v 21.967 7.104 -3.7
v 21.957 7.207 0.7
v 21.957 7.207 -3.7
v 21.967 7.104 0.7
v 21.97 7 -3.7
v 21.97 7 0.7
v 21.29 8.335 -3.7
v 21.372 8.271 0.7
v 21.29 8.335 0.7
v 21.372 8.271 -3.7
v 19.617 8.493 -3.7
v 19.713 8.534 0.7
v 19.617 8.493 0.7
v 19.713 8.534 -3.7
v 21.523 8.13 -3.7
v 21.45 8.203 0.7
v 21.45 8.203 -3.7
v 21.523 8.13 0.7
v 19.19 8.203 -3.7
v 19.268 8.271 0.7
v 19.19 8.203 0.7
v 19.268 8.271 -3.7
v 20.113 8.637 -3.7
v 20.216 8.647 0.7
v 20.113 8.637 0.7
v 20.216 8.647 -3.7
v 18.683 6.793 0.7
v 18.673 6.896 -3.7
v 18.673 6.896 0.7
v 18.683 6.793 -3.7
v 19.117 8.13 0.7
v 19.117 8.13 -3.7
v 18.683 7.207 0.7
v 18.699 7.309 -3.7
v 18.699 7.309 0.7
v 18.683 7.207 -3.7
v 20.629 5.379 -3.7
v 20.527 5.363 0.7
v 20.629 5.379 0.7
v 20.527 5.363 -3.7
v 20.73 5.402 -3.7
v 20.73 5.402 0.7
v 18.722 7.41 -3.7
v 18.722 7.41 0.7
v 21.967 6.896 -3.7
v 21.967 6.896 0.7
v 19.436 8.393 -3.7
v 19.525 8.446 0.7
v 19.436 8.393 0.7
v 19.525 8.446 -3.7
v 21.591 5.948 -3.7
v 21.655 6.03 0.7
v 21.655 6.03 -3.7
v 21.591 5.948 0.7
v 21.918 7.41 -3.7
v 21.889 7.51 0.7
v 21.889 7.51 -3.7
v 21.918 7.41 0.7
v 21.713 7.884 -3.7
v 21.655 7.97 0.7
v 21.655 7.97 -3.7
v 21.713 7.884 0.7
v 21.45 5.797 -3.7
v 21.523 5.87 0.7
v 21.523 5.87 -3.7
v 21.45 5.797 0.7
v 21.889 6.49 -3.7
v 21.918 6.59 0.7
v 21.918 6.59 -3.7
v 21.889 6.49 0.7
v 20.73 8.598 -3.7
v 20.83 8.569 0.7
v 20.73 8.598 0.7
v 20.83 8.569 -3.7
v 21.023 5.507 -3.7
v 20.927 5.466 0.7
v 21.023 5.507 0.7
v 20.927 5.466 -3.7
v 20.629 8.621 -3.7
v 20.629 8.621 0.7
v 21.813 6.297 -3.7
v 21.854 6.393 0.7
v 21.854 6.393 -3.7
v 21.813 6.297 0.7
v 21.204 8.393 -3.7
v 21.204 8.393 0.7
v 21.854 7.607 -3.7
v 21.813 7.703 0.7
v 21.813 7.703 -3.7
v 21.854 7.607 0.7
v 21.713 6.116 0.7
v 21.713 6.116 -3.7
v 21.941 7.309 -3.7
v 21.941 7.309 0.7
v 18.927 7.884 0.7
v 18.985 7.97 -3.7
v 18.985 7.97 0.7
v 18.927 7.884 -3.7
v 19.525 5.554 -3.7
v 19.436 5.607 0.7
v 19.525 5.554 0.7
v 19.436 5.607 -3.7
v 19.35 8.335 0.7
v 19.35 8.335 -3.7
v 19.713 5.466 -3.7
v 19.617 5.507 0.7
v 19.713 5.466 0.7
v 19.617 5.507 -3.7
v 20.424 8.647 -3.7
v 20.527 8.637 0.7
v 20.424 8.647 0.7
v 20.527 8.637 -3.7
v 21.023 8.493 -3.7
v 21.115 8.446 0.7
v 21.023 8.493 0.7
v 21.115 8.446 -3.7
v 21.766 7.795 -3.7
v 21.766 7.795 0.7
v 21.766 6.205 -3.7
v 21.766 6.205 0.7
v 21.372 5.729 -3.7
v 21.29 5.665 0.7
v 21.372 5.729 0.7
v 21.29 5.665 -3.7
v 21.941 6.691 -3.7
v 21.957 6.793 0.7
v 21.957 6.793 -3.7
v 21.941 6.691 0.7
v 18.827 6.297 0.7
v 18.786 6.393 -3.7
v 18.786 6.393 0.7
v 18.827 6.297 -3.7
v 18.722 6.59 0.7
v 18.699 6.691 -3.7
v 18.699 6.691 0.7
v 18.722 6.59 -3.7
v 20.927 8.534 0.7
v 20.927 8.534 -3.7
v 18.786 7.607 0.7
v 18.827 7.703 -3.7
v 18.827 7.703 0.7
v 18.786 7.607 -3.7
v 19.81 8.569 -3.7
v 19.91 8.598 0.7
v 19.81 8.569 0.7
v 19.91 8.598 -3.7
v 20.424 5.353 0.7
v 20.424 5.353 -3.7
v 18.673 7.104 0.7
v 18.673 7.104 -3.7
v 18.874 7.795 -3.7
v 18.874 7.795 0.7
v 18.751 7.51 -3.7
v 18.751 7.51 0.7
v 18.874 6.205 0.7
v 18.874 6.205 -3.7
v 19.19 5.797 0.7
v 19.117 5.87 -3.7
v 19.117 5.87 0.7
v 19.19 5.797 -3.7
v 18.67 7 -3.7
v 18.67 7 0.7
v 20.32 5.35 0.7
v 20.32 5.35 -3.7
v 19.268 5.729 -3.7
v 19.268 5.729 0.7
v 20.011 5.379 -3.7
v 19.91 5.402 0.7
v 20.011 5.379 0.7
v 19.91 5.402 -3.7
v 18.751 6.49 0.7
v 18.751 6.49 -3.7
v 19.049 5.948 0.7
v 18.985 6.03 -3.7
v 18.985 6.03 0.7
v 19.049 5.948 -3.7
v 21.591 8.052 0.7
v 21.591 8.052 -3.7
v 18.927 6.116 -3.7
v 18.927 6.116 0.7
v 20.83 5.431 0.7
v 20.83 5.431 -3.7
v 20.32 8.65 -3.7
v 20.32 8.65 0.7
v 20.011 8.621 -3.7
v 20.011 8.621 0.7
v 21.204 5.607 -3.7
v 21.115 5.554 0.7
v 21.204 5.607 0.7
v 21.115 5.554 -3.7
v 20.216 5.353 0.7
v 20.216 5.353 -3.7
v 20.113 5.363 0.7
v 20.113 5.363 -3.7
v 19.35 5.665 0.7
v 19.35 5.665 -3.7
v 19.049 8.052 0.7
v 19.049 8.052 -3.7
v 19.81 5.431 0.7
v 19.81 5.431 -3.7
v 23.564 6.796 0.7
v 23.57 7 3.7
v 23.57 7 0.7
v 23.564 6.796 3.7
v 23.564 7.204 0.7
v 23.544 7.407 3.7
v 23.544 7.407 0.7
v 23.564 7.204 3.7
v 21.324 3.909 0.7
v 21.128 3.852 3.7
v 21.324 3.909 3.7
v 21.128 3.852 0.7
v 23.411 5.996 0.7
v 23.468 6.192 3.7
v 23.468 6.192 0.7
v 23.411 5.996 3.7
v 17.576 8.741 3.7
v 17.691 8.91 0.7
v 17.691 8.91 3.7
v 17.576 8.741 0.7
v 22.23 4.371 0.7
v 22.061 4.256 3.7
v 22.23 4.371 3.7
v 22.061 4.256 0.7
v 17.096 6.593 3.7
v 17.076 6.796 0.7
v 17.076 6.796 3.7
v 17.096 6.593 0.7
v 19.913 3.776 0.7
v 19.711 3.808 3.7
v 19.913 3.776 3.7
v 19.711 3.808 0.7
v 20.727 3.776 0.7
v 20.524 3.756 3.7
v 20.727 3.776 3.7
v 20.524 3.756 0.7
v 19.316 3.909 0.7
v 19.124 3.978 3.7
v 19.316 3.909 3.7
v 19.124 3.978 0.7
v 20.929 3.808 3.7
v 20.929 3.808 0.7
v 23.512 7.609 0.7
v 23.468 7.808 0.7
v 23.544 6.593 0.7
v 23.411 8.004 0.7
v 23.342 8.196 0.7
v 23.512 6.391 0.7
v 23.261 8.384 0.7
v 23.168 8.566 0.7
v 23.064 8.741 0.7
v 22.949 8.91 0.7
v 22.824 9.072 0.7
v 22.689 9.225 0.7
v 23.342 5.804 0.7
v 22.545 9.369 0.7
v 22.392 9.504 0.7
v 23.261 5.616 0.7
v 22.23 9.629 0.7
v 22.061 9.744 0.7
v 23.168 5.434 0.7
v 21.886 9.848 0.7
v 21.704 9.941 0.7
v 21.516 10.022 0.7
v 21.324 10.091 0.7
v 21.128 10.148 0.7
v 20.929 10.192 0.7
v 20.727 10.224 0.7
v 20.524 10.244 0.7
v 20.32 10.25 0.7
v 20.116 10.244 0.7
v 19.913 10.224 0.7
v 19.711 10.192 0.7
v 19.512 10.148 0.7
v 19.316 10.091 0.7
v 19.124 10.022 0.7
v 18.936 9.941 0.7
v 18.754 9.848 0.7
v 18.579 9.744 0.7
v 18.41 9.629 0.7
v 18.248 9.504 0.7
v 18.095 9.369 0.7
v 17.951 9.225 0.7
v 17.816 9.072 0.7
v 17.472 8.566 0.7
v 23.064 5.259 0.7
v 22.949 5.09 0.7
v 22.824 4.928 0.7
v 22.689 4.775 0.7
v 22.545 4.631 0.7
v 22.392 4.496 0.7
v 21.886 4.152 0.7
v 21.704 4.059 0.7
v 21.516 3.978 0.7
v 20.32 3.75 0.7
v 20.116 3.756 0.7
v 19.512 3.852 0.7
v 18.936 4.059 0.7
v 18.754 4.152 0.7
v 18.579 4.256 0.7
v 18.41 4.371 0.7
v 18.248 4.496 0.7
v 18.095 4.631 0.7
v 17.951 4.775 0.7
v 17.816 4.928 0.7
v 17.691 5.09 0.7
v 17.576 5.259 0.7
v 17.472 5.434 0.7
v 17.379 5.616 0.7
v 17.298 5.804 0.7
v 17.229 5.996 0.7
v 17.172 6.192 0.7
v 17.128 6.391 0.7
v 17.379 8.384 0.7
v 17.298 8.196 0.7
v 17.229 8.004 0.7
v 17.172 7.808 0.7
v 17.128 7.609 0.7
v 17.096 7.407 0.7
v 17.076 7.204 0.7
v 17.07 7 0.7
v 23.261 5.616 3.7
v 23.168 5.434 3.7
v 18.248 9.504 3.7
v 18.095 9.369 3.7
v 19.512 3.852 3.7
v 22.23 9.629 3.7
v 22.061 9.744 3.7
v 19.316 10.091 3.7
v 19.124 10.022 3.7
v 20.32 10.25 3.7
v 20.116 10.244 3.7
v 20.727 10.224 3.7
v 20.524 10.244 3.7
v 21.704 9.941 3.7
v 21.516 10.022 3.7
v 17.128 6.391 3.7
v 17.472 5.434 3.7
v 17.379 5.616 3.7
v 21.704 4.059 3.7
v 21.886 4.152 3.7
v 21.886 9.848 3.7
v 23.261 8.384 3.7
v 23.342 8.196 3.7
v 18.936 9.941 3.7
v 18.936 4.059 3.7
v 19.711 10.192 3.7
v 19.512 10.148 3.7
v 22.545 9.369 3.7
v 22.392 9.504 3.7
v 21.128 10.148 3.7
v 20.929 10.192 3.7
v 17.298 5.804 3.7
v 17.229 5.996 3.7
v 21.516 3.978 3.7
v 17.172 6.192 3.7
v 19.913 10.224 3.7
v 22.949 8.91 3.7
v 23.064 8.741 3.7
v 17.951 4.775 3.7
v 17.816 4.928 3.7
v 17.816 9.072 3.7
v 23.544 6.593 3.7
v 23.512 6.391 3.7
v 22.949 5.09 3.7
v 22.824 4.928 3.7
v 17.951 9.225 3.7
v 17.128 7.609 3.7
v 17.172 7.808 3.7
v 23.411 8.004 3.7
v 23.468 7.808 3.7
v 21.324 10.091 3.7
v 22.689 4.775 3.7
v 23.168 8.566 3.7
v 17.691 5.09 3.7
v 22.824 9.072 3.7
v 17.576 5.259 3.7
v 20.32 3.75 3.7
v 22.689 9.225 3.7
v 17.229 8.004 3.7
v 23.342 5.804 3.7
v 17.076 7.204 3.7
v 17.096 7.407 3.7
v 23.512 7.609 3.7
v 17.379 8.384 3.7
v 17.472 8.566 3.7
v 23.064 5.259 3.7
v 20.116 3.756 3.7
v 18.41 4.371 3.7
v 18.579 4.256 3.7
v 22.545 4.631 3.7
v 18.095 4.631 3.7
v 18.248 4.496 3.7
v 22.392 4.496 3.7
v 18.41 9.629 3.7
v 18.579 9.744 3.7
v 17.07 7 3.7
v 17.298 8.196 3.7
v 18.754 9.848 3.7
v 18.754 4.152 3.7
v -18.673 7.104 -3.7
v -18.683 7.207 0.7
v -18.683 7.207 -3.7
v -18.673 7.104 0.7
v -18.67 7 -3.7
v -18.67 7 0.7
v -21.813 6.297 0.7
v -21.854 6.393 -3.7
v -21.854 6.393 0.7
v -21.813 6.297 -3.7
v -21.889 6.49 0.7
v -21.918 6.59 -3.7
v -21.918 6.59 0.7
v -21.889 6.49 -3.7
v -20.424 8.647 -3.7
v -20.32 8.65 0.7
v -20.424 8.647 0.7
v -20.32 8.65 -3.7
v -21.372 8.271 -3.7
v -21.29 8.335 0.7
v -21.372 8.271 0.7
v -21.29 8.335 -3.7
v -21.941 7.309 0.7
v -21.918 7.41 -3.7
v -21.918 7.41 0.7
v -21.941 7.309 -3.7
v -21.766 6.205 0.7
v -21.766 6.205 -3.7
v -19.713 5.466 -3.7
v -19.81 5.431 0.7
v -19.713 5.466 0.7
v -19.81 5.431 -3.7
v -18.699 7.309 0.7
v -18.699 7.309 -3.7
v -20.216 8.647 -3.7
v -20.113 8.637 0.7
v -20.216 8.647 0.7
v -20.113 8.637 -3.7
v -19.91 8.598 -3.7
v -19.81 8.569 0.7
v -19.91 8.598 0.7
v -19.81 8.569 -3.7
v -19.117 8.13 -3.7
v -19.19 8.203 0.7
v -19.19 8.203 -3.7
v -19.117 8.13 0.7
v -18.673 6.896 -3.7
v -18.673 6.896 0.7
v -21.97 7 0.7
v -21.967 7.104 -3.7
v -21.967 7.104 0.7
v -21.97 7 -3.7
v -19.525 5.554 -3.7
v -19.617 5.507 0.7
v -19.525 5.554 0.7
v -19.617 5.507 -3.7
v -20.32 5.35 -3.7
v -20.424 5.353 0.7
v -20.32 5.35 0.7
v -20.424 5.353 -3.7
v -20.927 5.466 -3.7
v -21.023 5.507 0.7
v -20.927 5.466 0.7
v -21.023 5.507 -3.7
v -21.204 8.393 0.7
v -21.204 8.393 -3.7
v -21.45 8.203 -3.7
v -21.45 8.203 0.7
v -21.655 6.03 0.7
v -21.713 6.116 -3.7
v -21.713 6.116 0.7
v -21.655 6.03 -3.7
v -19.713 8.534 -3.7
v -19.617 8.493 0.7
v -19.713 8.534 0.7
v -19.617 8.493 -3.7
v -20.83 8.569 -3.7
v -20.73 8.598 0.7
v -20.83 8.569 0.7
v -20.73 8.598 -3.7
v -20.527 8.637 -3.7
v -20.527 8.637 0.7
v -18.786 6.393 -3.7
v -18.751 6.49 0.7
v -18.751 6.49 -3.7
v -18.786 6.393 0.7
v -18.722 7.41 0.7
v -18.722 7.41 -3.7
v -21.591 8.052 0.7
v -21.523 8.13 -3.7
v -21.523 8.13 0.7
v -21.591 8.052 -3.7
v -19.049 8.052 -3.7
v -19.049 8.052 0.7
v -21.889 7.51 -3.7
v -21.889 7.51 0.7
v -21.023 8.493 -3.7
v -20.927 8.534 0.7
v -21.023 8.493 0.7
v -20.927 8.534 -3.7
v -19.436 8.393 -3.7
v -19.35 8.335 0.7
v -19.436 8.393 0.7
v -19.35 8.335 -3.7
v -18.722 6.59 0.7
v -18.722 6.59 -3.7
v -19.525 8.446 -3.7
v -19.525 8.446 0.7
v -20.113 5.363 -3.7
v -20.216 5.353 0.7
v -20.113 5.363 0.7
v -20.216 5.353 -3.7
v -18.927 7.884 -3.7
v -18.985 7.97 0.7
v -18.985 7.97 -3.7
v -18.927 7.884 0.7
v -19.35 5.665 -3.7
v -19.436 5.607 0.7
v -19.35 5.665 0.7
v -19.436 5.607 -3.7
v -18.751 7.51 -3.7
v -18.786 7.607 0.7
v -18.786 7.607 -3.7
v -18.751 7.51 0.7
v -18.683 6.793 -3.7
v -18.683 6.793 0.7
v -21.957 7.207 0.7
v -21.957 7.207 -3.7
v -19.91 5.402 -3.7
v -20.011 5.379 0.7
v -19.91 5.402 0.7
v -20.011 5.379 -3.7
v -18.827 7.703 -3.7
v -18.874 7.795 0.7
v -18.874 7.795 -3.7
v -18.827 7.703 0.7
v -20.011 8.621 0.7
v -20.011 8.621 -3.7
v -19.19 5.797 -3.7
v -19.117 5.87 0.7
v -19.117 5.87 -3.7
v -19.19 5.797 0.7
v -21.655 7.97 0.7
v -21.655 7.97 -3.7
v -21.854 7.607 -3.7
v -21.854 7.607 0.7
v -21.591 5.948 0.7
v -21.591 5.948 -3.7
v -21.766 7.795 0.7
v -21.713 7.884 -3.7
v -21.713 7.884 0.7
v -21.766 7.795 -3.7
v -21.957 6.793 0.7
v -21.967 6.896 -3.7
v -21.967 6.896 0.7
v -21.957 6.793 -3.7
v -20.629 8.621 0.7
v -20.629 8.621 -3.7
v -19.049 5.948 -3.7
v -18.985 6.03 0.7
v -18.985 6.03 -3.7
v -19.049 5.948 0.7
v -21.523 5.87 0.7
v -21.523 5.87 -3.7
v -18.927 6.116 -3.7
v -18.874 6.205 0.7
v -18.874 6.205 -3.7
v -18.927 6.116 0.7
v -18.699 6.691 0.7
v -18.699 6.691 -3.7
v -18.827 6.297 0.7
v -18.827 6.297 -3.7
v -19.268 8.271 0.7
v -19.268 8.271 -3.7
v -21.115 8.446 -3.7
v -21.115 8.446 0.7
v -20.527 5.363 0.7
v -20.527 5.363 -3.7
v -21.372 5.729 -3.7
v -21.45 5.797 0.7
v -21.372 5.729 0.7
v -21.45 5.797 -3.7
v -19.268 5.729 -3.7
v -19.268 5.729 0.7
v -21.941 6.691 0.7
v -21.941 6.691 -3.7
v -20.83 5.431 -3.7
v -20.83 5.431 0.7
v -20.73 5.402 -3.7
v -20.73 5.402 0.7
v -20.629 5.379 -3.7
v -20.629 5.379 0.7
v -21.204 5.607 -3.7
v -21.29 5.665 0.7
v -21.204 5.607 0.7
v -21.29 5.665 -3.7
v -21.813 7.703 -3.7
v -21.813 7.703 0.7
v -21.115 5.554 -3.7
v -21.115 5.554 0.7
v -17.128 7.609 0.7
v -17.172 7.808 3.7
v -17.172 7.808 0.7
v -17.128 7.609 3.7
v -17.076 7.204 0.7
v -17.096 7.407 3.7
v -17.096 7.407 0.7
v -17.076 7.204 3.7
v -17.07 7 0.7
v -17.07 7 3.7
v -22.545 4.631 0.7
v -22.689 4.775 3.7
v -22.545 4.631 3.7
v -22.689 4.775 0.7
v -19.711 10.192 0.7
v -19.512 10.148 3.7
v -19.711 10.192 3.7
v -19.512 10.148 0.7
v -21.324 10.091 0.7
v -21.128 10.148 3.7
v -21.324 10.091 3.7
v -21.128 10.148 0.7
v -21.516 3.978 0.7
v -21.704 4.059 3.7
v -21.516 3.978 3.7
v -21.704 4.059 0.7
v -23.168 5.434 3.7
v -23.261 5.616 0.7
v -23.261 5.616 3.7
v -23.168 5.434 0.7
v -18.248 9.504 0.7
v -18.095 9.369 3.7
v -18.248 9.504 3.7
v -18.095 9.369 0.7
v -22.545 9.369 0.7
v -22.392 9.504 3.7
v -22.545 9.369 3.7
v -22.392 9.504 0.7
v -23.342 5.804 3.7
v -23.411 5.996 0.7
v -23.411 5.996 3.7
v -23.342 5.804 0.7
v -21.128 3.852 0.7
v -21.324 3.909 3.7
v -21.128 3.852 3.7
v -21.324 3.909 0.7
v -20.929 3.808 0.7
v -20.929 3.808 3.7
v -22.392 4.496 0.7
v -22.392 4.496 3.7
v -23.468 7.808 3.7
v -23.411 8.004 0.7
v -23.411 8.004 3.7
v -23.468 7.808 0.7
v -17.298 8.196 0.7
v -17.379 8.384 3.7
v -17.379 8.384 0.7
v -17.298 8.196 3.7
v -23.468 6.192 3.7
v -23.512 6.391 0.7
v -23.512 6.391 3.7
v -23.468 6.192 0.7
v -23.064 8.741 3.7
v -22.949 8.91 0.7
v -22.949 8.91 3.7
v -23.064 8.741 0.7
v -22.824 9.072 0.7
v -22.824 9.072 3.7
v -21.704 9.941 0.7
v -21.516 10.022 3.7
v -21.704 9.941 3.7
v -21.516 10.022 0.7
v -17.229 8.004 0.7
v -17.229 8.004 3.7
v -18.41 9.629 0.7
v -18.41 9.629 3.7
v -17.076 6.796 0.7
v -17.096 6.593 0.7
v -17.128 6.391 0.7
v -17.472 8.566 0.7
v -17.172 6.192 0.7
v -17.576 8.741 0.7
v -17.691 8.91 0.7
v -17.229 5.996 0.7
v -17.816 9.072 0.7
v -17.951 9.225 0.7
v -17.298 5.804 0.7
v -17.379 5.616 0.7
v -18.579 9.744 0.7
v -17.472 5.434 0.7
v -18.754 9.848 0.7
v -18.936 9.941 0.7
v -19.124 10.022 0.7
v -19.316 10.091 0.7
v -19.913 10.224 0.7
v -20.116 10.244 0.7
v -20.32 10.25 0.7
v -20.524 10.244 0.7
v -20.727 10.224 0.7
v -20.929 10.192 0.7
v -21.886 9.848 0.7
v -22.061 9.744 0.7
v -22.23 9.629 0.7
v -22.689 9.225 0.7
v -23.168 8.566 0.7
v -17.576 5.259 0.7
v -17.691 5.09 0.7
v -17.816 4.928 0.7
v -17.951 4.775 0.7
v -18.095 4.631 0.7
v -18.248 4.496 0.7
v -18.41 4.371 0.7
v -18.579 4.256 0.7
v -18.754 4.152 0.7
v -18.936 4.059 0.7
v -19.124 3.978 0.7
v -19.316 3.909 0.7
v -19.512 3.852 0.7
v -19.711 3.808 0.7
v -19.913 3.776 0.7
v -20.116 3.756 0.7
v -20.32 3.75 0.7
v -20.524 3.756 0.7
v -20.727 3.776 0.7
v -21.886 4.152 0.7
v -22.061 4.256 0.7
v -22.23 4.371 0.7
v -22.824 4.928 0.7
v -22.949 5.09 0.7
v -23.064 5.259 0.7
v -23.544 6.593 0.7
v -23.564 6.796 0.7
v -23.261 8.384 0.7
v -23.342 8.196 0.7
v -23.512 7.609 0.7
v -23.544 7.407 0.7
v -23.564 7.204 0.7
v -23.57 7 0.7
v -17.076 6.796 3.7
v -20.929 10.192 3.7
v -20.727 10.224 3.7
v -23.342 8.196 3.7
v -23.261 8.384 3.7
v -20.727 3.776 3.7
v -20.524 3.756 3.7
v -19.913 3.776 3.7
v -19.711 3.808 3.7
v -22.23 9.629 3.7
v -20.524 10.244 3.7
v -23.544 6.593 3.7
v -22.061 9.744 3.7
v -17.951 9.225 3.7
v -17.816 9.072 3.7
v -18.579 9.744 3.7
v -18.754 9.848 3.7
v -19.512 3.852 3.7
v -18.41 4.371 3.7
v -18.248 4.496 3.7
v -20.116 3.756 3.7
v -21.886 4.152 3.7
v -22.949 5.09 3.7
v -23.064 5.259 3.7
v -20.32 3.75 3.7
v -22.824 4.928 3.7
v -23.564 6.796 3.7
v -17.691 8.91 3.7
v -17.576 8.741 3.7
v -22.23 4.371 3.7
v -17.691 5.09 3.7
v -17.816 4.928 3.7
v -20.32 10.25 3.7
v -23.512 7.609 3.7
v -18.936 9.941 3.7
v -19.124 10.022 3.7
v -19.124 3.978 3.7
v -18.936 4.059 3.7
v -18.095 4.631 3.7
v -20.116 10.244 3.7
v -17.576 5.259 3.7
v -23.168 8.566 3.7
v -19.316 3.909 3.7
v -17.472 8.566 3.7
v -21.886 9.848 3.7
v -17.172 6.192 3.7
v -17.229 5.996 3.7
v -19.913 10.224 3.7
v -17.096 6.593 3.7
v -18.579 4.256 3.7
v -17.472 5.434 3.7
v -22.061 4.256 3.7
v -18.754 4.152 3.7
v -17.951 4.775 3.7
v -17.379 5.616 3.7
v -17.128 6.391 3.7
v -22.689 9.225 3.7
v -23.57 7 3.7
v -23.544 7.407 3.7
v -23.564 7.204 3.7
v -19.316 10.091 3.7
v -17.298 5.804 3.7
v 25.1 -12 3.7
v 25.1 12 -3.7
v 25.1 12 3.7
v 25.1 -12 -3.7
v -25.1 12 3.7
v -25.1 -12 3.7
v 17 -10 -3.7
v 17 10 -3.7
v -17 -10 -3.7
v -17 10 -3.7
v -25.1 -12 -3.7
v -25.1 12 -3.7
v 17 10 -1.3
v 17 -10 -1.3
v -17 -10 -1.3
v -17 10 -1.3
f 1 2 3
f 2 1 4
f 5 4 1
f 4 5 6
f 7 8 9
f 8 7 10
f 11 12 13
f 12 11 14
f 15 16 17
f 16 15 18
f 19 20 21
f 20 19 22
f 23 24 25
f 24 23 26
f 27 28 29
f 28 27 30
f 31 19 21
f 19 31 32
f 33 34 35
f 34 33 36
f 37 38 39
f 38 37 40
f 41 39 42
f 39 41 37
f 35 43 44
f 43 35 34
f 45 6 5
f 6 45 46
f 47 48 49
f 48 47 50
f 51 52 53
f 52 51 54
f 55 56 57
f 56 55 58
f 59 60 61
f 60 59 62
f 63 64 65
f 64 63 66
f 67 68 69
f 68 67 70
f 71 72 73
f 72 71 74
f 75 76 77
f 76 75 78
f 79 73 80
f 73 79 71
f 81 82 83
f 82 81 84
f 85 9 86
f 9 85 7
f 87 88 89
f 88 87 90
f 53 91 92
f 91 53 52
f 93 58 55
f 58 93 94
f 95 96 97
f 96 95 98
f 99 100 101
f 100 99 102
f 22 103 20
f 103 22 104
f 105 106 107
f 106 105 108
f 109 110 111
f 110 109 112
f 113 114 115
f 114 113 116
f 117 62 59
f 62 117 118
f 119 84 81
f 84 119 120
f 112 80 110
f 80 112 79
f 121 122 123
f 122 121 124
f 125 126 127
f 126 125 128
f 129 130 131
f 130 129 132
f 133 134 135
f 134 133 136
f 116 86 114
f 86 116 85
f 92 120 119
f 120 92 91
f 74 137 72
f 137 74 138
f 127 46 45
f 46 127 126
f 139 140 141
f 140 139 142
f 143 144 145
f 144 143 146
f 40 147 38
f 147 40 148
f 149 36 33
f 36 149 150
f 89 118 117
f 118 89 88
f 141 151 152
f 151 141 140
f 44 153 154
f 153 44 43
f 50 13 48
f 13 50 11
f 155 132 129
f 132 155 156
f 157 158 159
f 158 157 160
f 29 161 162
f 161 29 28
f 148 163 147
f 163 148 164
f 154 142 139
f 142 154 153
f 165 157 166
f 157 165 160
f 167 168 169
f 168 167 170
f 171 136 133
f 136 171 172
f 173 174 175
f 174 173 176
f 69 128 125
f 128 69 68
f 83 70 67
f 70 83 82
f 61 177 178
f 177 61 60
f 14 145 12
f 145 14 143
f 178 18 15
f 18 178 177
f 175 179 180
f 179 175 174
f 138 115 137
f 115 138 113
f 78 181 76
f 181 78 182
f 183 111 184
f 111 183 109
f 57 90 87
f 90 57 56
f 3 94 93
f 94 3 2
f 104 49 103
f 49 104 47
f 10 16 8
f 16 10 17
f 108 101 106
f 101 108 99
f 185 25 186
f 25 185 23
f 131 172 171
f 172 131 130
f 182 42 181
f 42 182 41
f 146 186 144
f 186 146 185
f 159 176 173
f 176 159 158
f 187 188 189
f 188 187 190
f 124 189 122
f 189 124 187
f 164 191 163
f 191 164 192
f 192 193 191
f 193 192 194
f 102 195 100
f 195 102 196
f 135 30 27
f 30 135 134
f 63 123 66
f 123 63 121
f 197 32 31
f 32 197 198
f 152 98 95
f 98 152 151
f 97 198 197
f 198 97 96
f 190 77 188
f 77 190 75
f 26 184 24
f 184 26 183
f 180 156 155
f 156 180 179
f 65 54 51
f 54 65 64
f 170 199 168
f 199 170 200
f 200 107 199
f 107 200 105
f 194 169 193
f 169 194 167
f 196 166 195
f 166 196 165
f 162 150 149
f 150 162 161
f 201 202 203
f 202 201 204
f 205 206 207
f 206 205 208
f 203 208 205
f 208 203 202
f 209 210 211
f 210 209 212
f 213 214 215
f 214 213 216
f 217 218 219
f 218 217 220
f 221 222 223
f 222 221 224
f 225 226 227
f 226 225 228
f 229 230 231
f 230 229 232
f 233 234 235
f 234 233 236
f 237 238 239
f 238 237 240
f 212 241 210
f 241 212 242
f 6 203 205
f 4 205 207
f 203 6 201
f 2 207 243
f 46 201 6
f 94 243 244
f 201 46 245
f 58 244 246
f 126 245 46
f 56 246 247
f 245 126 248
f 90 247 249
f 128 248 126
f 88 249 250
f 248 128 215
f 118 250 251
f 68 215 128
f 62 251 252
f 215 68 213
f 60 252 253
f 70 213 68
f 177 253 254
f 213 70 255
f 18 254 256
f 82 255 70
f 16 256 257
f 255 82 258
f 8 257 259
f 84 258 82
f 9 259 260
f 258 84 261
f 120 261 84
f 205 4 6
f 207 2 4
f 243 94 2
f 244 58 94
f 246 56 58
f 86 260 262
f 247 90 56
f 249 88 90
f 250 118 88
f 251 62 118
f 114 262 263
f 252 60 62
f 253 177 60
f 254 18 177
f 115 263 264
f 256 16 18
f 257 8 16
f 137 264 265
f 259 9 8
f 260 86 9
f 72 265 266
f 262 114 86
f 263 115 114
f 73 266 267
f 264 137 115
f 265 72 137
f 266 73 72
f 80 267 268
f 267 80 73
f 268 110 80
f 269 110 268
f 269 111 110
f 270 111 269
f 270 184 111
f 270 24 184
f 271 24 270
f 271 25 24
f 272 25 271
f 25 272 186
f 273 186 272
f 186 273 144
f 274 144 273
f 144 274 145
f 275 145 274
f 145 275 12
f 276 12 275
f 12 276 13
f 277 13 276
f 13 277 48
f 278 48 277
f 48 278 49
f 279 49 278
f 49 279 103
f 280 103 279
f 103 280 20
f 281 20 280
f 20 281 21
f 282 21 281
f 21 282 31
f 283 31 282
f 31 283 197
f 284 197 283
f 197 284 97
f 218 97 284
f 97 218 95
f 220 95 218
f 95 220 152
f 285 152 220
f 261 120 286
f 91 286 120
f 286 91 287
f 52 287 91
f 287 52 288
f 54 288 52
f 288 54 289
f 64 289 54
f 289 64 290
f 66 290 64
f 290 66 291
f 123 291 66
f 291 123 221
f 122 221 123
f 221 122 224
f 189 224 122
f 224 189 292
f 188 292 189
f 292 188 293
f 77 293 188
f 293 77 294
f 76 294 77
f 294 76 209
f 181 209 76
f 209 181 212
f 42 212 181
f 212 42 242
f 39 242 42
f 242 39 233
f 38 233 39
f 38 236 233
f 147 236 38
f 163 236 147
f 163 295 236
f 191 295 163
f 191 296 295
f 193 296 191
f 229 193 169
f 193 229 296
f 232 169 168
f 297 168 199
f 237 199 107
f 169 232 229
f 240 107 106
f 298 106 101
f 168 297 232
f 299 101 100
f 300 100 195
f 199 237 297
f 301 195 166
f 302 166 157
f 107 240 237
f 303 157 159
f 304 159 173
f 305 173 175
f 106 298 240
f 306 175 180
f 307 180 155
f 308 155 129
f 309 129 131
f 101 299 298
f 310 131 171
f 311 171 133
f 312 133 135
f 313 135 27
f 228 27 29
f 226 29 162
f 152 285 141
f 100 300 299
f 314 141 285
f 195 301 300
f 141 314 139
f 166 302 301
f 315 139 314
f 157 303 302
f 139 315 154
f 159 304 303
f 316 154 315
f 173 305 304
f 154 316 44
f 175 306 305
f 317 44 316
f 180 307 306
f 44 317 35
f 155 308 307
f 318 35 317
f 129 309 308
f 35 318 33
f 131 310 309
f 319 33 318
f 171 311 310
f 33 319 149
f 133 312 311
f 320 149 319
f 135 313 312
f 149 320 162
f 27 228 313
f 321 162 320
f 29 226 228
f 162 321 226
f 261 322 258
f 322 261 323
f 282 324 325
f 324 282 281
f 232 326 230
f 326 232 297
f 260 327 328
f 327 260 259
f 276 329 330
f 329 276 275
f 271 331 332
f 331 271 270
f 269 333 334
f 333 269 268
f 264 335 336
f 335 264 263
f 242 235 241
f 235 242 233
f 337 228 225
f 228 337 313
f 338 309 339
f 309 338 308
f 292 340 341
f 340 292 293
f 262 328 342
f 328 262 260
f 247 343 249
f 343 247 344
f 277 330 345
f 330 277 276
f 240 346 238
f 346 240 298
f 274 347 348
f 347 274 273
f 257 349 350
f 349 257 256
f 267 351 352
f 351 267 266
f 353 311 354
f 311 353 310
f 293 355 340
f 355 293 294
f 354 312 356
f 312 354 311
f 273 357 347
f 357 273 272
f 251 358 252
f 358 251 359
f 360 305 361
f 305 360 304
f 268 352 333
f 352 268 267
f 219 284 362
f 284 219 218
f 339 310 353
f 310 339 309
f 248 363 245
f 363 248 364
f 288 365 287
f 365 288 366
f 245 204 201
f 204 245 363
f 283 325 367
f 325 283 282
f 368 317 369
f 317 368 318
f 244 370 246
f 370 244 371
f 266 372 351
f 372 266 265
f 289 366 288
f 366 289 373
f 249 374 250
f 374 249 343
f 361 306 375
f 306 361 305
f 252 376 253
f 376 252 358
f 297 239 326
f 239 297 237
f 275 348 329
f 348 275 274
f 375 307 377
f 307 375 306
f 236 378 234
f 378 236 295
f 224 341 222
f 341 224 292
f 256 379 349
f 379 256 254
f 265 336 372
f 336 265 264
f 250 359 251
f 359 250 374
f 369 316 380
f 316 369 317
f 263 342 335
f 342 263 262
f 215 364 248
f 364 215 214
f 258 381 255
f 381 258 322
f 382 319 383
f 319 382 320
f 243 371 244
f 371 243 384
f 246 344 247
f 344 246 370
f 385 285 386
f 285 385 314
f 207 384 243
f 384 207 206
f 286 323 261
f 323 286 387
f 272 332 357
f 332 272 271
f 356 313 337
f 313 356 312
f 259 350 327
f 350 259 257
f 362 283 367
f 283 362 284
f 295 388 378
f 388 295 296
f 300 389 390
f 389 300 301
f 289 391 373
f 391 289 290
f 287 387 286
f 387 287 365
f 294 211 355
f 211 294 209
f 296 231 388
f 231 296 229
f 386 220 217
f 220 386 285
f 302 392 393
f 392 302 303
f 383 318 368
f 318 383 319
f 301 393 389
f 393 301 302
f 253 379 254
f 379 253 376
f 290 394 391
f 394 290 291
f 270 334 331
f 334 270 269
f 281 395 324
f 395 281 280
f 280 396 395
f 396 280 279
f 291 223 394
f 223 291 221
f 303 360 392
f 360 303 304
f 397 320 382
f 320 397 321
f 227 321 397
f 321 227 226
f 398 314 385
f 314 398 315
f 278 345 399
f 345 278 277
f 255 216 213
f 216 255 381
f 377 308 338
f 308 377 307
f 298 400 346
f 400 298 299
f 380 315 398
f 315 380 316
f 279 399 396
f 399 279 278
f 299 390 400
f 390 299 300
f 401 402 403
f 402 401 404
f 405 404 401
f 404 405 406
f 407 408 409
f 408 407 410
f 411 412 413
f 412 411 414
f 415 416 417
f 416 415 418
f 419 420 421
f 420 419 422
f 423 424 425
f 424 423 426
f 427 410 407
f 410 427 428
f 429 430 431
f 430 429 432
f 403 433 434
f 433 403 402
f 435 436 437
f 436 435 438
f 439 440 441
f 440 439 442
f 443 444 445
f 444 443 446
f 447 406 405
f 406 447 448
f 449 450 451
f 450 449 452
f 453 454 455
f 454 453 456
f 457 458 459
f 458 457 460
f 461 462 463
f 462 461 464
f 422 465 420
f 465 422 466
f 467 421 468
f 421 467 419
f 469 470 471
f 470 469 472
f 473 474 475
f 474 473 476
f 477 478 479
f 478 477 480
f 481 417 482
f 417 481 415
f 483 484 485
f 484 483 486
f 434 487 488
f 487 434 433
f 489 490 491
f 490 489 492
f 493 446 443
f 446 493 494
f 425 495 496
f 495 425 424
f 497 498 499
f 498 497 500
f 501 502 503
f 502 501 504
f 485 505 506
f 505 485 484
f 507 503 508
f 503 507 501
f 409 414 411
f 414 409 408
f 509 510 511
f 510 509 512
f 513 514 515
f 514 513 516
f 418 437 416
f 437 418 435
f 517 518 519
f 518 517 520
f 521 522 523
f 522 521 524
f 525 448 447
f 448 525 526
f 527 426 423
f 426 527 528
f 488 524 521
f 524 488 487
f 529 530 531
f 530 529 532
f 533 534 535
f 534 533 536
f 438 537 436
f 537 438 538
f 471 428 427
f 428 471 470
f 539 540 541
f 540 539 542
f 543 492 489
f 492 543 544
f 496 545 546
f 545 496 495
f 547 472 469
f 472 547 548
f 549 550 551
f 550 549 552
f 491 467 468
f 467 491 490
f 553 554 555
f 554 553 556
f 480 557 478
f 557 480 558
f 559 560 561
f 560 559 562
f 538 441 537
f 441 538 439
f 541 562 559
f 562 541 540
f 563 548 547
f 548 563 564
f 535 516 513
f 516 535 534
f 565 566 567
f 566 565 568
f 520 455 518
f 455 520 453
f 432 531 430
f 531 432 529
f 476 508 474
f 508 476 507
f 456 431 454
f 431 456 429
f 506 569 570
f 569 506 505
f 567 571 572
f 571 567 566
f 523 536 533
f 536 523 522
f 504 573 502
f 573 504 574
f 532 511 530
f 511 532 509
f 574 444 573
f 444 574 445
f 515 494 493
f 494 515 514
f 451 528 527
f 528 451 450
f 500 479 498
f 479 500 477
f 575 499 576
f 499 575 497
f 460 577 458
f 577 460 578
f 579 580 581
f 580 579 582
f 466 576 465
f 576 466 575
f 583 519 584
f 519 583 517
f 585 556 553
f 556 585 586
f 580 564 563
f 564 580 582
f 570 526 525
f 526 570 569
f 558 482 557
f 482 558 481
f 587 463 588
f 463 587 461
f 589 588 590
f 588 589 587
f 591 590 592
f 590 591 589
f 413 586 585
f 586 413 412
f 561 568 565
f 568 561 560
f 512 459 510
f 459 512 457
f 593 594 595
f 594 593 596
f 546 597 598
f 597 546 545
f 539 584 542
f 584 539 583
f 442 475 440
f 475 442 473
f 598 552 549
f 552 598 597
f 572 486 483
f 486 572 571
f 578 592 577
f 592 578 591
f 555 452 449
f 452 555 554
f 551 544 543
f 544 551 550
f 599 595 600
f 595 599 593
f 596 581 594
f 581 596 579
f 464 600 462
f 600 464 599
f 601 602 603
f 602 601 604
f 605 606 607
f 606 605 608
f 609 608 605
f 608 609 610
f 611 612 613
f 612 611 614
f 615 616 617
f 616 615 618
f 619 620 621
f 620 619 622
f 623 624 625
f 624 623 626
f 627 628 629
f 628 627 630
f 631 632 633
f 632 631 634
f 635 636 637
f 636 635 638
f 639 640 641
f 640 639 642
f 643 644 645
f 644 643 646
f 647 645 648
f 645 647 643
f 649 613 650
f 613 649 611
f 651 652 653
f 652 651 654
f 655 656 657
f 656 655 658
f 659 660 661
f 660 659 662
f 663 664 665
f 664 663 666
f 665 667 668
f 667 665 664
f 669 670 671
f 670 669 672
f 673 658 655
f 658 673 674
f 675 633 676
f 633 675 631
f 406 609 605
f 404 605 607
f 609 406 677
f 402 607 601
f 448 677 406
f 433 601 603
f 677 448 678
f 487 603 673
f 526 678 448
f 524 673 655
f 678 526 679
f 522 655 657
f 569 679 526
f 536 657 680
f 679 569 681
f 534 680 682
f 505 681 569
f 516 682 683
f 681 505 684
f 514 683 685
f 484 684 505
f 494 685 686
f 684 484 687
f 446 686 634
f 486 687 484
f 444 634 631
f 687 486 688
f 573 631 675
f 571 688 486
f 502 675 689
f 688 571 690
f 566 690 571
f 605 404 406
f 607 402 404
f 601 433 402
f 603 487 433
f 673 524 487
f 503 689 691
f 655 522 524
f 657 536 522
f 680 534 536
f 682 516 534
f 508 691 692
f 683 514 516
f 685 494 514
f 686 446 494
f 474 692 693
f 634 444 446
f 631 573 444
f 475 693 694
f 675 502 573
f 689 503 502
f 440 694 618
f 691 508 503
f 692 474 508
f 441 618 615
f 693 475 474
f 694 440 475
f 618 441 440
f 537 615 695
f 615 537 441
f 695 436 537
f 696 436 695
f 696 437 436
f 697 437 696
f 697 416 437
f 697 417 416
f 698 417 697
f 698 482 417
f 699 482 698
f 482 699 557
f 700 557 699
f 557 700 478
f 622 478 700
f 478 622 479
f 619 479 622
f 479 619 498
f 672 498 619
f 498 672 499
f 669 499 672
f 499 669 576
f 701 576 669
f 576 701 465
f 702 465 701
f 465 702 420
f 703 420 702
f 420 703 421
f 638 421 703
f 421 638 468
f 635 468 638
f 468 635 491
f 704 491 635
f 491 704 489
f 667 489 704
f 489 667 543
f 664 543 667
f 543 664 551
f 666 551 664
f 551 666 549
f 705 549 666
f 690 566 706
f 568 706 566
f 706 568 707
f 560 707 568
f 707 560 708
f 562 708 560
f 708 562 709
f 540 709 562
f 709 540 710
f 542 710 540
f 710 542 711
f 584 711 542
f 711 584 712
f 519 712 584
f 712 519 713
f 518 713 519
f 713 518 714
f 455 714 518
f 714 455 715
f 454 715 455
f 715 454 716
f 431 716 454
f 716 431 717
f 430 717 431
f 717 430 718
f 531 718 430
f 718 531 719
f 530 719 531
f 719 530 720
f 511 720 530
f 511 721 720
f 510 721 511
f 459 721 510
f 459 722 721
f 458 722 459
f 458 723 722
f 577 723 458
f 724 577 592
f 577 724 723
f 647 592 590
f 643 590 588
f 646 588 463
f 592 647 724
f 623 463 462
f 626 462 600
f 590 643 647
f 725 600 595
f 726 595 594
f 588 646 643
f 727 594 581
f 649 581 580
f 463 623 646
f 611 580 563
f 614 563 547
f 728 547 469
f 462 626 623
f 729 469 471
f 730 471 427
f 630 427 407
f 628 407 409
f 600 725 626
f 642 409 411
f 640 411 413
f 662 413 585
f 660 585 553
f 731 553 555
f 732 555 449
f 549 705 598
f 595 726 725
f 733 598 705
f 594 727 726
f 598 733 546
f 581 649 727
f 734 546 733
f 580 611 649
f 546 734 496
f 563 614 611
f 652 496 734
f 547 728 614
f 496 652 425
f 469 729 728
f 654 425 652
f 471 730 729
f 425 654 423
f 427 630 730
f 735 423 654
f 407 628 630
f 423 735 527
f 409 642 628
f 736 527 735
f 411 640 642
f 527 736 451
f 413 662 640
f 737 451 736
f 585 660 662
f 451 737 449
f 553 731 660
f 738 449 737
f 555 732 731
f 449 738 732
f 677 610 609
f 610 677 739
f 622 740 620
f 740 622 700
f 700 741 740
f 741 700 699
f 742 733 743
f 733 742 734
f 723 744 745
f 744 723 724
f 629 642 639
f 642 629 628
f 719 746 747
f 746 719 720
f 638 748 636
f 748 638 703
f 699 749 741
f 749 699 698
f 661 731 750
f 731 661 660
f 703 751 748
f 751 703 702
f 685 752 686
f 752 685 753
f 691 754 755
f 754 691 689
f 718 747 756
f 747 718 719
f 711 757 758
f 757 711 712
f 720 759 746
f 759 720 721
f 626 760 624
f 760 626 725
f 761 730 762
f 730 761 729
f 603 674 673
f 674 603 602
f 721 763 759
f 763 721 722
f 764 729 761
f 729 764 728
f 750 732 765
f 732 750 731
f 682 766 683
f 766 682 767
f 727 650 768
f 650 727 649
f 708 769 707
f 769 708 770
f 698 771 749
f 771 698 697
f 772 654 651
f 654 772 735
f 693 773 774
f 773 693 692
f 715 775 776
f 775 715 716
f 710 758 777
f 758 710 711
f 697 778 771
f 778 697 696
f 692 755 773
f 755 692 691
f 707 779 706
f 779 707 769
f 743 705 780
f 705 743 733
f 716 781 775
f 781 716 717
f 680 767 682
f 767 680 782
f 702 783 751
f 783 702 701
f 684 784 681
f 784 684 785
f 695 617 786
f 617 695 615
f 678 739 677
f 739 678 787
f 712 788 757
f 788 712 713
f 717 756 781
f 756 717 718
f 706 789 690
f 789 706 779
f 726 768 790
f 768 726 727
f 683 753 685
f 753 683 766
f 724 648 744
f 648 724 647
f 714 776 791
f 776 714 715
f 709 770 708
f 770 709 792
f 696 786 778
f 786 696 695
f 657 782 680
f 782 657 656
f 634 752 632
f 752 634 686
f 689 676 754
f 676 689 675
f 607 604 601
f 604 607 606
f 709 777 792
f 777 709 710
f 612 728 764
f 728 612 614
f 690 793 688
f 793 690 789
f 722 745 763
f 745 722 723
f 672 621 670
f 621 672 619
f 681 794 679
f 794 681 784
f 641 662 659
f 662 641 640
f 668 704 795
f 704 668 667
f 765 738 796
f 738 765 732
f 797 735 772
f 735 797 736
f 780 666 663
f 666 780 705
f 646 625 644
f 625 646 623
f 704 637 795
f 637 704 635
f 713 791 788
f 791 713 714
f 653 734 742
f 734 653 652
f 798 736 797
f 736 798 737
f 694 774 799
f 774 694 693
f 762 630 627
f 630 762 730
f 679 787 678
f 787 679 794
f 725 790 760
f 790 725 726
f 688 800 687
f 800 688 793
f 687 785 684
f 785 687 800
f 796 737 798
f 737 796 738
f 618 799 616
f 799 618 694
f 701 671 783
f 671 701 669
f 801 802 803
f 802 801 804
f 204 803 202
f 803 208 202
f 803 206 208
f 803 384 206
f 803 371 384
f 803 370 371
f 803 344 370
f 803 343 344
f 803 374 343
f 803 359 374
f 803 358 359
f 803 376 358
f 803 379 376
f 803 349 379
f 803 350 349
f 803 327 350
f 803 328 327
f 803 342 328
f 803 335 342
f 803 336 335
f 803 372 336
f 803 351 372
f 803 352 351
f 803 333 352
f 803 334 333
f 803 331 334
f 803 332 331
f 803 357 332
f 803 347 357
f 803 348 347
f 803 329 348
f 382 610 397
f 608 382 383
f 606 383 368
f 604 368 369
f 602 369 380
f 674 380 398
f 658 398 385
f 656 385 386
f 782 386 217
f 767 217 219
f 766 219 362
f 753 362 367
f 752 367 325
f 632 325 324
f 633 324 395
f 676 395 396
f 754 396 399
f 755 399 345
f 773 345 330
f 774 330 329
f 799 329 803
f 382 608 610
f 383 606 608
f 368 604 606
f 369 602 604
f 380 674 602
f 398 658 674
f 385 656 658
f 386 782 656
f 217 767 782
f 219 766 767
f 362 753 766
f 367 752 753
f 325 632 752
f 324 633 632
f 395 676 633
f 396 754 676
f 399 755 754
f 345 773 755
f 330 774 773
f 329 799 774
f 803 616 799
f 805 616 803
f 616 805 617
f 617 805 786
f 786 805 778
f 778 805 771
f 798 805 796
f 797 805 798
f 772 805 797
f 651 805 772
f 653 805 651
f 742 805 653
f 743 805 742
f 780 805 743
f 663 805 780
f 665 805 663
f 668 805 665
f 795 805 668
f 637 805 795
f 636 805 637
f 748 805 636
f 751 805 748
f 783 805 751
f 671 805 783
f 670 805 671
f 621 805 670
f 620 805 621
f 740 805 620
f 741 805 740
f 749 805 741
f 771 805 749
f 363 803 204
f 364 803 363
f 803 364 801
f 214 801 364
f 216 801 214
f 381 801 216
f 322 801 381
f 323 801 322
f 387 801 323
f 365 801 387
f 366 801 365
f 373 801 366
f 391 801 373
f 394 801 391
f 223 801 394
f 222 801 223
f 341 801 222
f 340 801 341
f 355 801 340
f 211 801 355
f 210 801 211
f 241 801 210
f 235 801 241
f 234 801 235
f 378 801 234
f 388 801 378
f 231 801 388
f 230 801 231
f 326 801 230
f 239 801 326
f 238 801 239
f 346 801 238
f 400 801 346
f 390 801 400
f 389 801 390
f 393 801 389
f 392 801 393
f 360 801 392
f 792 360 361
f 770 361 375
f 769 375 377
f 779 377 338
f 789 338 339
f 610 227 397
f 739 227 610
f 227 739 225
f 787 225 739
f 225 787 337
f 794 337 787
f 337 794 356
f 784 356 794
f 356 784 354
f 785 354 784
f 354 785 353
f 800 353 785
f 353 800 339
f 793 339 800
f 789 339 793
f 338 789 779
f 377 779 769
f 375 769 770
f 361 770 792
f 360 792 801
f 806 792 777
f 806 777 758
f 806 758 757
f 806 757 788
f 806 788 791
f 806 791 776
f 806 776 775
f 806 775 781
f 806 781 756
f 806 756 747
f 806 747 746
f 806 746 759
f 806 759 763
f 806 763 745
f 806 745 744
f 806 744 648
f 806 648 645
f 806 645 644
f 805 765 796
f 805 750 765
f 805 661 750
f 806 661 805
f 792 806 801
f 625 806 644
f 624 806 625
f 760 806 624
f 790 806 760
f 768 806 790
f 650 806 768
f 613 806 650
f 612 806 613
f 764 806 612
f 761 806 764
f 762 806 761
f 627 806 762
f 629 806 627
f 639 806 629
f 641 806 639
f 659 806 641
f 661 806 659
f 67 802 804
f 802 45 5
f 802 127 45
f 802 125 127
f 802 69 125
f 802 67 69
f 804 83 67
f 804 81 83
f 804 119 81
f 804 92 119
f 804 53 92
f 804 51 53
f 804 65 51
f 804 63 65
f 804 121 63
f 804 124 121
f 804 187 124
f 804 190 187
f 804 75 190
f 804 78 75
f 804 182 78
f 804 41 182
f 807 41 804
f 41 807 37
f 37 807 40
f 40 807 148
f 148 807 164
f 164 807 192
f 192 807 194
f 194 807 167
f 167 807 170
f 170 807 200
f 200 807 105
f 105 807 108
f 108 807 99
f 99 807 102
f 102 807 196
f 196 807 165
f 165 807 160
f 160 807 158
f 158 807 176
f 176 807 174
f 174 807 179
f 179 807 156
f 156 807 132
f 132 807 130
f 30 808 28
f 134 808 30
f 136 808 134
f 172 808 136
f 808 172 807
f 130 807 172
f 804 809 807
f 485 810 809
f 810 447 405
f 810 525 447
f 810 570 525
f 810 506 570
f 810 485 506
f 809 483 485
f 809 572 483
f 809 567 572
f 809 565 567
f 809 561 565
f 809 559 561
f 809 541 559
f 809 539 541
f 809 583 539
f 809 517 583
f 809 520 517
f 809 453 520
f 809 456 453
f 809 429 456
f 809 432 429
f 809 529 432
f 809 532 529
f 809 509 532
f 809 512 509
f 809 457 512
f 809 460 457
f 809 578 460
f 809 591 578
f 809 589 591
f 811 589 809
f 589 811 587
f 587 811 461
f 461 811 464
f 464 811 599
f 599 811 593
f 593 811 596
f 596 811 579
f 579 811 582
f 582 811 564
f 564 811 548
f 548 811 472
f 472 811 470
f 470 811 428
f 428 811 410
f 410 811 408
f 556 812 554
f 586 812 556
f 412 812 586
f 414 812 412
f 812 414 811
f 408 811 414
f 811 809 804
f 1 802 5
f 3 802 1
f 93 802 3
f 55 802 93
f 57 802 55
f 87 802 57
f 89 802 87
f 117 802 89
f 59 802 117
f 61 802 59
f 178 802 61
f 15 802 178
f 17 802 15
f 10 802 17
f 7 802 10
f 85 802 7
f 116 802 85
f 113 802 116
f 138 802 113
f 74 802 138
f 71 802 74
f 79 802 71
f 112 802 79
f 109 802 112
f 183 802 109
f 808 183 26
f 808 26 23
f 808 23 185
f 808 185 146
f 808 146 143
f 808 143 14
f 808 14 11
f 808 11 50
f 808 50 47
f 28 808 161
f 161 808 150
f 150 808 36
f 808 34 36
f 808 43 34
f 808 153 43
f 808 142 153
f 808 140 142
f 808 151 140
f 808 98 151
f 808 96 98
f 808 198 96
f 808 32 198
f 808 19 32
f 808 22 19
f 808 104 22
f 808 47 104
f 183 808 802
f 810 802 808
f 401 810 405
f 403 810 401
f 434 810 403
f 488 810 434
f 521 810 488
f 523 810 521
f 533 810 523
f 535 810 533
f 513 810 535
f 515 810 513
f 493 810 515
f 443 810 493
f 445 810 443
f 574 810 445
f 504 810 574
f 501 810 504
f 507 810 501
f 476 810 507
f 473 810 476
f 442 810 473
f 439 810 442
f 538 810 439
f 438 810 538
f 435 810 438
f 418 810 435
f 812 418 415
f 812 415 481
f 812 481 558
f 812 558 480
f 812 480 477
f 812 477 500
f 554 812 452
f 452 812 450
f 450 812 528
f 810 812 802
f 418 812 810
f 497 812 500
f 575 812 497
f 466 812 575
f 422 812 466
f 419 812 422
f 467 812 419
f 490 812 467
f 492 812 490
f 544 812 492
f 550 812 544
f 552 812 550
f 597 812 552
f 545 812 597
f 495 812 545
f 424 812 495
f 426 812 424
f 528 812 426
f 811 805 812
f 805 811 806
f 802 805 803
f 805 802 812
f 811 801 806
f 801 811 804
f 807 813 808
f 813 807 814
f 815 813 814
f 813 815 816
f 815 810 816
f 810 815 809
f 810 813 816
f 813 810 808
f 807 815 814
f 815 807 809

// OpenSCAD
$fn=100;

repair_s=2;
repair=100;

//sirka sroubu 
vzdalenost_sroubu=4*10.16; //jejich stredu

//rozmery diody
di_in_x=34;
di_in_y=20;
di_in_z=2.4;

//stinitko diody
di_out_x=50.2;
di_out_y=24;
di_out_z=di_in_z+5;

nut_d_y_2=26.6+38;
thickness=5;

box_out_y=120;
box_in_y=box_out_y-2*thickness;


//nut
nut_height=2.2+repair_s;//(plate_s_z+plate_s_thickness)-plate_z;
nut_d_in=3.3;
nut_d=6.5;


nut_trans_y=di_out_y/2-5;

nut_zapusteni=3+repair_s;


difference(){
    cube([di_out_x, di_out_y, di_out_z], center=true);
    #translate([0,0,-di_out_z/2+(di_in_z)/2]) cube([di_in_x, di_in_y, di_in_z], center =true);
    
   for(i=[vzdalenost_sroubu/2, -vzdalenost_sroubu/2]){ translate([i,nut_trans_y,-di_out_z-repair_s])cylinder(h=nut_height+repair,d=nut_d_in);
    translate([i,nut_trans_y,di_out_z/2-nut_zapusteni+repair_s]) cylinder(h=nut_zapusteni, d=nut_d, $fn=100);
    }
    
    
}
